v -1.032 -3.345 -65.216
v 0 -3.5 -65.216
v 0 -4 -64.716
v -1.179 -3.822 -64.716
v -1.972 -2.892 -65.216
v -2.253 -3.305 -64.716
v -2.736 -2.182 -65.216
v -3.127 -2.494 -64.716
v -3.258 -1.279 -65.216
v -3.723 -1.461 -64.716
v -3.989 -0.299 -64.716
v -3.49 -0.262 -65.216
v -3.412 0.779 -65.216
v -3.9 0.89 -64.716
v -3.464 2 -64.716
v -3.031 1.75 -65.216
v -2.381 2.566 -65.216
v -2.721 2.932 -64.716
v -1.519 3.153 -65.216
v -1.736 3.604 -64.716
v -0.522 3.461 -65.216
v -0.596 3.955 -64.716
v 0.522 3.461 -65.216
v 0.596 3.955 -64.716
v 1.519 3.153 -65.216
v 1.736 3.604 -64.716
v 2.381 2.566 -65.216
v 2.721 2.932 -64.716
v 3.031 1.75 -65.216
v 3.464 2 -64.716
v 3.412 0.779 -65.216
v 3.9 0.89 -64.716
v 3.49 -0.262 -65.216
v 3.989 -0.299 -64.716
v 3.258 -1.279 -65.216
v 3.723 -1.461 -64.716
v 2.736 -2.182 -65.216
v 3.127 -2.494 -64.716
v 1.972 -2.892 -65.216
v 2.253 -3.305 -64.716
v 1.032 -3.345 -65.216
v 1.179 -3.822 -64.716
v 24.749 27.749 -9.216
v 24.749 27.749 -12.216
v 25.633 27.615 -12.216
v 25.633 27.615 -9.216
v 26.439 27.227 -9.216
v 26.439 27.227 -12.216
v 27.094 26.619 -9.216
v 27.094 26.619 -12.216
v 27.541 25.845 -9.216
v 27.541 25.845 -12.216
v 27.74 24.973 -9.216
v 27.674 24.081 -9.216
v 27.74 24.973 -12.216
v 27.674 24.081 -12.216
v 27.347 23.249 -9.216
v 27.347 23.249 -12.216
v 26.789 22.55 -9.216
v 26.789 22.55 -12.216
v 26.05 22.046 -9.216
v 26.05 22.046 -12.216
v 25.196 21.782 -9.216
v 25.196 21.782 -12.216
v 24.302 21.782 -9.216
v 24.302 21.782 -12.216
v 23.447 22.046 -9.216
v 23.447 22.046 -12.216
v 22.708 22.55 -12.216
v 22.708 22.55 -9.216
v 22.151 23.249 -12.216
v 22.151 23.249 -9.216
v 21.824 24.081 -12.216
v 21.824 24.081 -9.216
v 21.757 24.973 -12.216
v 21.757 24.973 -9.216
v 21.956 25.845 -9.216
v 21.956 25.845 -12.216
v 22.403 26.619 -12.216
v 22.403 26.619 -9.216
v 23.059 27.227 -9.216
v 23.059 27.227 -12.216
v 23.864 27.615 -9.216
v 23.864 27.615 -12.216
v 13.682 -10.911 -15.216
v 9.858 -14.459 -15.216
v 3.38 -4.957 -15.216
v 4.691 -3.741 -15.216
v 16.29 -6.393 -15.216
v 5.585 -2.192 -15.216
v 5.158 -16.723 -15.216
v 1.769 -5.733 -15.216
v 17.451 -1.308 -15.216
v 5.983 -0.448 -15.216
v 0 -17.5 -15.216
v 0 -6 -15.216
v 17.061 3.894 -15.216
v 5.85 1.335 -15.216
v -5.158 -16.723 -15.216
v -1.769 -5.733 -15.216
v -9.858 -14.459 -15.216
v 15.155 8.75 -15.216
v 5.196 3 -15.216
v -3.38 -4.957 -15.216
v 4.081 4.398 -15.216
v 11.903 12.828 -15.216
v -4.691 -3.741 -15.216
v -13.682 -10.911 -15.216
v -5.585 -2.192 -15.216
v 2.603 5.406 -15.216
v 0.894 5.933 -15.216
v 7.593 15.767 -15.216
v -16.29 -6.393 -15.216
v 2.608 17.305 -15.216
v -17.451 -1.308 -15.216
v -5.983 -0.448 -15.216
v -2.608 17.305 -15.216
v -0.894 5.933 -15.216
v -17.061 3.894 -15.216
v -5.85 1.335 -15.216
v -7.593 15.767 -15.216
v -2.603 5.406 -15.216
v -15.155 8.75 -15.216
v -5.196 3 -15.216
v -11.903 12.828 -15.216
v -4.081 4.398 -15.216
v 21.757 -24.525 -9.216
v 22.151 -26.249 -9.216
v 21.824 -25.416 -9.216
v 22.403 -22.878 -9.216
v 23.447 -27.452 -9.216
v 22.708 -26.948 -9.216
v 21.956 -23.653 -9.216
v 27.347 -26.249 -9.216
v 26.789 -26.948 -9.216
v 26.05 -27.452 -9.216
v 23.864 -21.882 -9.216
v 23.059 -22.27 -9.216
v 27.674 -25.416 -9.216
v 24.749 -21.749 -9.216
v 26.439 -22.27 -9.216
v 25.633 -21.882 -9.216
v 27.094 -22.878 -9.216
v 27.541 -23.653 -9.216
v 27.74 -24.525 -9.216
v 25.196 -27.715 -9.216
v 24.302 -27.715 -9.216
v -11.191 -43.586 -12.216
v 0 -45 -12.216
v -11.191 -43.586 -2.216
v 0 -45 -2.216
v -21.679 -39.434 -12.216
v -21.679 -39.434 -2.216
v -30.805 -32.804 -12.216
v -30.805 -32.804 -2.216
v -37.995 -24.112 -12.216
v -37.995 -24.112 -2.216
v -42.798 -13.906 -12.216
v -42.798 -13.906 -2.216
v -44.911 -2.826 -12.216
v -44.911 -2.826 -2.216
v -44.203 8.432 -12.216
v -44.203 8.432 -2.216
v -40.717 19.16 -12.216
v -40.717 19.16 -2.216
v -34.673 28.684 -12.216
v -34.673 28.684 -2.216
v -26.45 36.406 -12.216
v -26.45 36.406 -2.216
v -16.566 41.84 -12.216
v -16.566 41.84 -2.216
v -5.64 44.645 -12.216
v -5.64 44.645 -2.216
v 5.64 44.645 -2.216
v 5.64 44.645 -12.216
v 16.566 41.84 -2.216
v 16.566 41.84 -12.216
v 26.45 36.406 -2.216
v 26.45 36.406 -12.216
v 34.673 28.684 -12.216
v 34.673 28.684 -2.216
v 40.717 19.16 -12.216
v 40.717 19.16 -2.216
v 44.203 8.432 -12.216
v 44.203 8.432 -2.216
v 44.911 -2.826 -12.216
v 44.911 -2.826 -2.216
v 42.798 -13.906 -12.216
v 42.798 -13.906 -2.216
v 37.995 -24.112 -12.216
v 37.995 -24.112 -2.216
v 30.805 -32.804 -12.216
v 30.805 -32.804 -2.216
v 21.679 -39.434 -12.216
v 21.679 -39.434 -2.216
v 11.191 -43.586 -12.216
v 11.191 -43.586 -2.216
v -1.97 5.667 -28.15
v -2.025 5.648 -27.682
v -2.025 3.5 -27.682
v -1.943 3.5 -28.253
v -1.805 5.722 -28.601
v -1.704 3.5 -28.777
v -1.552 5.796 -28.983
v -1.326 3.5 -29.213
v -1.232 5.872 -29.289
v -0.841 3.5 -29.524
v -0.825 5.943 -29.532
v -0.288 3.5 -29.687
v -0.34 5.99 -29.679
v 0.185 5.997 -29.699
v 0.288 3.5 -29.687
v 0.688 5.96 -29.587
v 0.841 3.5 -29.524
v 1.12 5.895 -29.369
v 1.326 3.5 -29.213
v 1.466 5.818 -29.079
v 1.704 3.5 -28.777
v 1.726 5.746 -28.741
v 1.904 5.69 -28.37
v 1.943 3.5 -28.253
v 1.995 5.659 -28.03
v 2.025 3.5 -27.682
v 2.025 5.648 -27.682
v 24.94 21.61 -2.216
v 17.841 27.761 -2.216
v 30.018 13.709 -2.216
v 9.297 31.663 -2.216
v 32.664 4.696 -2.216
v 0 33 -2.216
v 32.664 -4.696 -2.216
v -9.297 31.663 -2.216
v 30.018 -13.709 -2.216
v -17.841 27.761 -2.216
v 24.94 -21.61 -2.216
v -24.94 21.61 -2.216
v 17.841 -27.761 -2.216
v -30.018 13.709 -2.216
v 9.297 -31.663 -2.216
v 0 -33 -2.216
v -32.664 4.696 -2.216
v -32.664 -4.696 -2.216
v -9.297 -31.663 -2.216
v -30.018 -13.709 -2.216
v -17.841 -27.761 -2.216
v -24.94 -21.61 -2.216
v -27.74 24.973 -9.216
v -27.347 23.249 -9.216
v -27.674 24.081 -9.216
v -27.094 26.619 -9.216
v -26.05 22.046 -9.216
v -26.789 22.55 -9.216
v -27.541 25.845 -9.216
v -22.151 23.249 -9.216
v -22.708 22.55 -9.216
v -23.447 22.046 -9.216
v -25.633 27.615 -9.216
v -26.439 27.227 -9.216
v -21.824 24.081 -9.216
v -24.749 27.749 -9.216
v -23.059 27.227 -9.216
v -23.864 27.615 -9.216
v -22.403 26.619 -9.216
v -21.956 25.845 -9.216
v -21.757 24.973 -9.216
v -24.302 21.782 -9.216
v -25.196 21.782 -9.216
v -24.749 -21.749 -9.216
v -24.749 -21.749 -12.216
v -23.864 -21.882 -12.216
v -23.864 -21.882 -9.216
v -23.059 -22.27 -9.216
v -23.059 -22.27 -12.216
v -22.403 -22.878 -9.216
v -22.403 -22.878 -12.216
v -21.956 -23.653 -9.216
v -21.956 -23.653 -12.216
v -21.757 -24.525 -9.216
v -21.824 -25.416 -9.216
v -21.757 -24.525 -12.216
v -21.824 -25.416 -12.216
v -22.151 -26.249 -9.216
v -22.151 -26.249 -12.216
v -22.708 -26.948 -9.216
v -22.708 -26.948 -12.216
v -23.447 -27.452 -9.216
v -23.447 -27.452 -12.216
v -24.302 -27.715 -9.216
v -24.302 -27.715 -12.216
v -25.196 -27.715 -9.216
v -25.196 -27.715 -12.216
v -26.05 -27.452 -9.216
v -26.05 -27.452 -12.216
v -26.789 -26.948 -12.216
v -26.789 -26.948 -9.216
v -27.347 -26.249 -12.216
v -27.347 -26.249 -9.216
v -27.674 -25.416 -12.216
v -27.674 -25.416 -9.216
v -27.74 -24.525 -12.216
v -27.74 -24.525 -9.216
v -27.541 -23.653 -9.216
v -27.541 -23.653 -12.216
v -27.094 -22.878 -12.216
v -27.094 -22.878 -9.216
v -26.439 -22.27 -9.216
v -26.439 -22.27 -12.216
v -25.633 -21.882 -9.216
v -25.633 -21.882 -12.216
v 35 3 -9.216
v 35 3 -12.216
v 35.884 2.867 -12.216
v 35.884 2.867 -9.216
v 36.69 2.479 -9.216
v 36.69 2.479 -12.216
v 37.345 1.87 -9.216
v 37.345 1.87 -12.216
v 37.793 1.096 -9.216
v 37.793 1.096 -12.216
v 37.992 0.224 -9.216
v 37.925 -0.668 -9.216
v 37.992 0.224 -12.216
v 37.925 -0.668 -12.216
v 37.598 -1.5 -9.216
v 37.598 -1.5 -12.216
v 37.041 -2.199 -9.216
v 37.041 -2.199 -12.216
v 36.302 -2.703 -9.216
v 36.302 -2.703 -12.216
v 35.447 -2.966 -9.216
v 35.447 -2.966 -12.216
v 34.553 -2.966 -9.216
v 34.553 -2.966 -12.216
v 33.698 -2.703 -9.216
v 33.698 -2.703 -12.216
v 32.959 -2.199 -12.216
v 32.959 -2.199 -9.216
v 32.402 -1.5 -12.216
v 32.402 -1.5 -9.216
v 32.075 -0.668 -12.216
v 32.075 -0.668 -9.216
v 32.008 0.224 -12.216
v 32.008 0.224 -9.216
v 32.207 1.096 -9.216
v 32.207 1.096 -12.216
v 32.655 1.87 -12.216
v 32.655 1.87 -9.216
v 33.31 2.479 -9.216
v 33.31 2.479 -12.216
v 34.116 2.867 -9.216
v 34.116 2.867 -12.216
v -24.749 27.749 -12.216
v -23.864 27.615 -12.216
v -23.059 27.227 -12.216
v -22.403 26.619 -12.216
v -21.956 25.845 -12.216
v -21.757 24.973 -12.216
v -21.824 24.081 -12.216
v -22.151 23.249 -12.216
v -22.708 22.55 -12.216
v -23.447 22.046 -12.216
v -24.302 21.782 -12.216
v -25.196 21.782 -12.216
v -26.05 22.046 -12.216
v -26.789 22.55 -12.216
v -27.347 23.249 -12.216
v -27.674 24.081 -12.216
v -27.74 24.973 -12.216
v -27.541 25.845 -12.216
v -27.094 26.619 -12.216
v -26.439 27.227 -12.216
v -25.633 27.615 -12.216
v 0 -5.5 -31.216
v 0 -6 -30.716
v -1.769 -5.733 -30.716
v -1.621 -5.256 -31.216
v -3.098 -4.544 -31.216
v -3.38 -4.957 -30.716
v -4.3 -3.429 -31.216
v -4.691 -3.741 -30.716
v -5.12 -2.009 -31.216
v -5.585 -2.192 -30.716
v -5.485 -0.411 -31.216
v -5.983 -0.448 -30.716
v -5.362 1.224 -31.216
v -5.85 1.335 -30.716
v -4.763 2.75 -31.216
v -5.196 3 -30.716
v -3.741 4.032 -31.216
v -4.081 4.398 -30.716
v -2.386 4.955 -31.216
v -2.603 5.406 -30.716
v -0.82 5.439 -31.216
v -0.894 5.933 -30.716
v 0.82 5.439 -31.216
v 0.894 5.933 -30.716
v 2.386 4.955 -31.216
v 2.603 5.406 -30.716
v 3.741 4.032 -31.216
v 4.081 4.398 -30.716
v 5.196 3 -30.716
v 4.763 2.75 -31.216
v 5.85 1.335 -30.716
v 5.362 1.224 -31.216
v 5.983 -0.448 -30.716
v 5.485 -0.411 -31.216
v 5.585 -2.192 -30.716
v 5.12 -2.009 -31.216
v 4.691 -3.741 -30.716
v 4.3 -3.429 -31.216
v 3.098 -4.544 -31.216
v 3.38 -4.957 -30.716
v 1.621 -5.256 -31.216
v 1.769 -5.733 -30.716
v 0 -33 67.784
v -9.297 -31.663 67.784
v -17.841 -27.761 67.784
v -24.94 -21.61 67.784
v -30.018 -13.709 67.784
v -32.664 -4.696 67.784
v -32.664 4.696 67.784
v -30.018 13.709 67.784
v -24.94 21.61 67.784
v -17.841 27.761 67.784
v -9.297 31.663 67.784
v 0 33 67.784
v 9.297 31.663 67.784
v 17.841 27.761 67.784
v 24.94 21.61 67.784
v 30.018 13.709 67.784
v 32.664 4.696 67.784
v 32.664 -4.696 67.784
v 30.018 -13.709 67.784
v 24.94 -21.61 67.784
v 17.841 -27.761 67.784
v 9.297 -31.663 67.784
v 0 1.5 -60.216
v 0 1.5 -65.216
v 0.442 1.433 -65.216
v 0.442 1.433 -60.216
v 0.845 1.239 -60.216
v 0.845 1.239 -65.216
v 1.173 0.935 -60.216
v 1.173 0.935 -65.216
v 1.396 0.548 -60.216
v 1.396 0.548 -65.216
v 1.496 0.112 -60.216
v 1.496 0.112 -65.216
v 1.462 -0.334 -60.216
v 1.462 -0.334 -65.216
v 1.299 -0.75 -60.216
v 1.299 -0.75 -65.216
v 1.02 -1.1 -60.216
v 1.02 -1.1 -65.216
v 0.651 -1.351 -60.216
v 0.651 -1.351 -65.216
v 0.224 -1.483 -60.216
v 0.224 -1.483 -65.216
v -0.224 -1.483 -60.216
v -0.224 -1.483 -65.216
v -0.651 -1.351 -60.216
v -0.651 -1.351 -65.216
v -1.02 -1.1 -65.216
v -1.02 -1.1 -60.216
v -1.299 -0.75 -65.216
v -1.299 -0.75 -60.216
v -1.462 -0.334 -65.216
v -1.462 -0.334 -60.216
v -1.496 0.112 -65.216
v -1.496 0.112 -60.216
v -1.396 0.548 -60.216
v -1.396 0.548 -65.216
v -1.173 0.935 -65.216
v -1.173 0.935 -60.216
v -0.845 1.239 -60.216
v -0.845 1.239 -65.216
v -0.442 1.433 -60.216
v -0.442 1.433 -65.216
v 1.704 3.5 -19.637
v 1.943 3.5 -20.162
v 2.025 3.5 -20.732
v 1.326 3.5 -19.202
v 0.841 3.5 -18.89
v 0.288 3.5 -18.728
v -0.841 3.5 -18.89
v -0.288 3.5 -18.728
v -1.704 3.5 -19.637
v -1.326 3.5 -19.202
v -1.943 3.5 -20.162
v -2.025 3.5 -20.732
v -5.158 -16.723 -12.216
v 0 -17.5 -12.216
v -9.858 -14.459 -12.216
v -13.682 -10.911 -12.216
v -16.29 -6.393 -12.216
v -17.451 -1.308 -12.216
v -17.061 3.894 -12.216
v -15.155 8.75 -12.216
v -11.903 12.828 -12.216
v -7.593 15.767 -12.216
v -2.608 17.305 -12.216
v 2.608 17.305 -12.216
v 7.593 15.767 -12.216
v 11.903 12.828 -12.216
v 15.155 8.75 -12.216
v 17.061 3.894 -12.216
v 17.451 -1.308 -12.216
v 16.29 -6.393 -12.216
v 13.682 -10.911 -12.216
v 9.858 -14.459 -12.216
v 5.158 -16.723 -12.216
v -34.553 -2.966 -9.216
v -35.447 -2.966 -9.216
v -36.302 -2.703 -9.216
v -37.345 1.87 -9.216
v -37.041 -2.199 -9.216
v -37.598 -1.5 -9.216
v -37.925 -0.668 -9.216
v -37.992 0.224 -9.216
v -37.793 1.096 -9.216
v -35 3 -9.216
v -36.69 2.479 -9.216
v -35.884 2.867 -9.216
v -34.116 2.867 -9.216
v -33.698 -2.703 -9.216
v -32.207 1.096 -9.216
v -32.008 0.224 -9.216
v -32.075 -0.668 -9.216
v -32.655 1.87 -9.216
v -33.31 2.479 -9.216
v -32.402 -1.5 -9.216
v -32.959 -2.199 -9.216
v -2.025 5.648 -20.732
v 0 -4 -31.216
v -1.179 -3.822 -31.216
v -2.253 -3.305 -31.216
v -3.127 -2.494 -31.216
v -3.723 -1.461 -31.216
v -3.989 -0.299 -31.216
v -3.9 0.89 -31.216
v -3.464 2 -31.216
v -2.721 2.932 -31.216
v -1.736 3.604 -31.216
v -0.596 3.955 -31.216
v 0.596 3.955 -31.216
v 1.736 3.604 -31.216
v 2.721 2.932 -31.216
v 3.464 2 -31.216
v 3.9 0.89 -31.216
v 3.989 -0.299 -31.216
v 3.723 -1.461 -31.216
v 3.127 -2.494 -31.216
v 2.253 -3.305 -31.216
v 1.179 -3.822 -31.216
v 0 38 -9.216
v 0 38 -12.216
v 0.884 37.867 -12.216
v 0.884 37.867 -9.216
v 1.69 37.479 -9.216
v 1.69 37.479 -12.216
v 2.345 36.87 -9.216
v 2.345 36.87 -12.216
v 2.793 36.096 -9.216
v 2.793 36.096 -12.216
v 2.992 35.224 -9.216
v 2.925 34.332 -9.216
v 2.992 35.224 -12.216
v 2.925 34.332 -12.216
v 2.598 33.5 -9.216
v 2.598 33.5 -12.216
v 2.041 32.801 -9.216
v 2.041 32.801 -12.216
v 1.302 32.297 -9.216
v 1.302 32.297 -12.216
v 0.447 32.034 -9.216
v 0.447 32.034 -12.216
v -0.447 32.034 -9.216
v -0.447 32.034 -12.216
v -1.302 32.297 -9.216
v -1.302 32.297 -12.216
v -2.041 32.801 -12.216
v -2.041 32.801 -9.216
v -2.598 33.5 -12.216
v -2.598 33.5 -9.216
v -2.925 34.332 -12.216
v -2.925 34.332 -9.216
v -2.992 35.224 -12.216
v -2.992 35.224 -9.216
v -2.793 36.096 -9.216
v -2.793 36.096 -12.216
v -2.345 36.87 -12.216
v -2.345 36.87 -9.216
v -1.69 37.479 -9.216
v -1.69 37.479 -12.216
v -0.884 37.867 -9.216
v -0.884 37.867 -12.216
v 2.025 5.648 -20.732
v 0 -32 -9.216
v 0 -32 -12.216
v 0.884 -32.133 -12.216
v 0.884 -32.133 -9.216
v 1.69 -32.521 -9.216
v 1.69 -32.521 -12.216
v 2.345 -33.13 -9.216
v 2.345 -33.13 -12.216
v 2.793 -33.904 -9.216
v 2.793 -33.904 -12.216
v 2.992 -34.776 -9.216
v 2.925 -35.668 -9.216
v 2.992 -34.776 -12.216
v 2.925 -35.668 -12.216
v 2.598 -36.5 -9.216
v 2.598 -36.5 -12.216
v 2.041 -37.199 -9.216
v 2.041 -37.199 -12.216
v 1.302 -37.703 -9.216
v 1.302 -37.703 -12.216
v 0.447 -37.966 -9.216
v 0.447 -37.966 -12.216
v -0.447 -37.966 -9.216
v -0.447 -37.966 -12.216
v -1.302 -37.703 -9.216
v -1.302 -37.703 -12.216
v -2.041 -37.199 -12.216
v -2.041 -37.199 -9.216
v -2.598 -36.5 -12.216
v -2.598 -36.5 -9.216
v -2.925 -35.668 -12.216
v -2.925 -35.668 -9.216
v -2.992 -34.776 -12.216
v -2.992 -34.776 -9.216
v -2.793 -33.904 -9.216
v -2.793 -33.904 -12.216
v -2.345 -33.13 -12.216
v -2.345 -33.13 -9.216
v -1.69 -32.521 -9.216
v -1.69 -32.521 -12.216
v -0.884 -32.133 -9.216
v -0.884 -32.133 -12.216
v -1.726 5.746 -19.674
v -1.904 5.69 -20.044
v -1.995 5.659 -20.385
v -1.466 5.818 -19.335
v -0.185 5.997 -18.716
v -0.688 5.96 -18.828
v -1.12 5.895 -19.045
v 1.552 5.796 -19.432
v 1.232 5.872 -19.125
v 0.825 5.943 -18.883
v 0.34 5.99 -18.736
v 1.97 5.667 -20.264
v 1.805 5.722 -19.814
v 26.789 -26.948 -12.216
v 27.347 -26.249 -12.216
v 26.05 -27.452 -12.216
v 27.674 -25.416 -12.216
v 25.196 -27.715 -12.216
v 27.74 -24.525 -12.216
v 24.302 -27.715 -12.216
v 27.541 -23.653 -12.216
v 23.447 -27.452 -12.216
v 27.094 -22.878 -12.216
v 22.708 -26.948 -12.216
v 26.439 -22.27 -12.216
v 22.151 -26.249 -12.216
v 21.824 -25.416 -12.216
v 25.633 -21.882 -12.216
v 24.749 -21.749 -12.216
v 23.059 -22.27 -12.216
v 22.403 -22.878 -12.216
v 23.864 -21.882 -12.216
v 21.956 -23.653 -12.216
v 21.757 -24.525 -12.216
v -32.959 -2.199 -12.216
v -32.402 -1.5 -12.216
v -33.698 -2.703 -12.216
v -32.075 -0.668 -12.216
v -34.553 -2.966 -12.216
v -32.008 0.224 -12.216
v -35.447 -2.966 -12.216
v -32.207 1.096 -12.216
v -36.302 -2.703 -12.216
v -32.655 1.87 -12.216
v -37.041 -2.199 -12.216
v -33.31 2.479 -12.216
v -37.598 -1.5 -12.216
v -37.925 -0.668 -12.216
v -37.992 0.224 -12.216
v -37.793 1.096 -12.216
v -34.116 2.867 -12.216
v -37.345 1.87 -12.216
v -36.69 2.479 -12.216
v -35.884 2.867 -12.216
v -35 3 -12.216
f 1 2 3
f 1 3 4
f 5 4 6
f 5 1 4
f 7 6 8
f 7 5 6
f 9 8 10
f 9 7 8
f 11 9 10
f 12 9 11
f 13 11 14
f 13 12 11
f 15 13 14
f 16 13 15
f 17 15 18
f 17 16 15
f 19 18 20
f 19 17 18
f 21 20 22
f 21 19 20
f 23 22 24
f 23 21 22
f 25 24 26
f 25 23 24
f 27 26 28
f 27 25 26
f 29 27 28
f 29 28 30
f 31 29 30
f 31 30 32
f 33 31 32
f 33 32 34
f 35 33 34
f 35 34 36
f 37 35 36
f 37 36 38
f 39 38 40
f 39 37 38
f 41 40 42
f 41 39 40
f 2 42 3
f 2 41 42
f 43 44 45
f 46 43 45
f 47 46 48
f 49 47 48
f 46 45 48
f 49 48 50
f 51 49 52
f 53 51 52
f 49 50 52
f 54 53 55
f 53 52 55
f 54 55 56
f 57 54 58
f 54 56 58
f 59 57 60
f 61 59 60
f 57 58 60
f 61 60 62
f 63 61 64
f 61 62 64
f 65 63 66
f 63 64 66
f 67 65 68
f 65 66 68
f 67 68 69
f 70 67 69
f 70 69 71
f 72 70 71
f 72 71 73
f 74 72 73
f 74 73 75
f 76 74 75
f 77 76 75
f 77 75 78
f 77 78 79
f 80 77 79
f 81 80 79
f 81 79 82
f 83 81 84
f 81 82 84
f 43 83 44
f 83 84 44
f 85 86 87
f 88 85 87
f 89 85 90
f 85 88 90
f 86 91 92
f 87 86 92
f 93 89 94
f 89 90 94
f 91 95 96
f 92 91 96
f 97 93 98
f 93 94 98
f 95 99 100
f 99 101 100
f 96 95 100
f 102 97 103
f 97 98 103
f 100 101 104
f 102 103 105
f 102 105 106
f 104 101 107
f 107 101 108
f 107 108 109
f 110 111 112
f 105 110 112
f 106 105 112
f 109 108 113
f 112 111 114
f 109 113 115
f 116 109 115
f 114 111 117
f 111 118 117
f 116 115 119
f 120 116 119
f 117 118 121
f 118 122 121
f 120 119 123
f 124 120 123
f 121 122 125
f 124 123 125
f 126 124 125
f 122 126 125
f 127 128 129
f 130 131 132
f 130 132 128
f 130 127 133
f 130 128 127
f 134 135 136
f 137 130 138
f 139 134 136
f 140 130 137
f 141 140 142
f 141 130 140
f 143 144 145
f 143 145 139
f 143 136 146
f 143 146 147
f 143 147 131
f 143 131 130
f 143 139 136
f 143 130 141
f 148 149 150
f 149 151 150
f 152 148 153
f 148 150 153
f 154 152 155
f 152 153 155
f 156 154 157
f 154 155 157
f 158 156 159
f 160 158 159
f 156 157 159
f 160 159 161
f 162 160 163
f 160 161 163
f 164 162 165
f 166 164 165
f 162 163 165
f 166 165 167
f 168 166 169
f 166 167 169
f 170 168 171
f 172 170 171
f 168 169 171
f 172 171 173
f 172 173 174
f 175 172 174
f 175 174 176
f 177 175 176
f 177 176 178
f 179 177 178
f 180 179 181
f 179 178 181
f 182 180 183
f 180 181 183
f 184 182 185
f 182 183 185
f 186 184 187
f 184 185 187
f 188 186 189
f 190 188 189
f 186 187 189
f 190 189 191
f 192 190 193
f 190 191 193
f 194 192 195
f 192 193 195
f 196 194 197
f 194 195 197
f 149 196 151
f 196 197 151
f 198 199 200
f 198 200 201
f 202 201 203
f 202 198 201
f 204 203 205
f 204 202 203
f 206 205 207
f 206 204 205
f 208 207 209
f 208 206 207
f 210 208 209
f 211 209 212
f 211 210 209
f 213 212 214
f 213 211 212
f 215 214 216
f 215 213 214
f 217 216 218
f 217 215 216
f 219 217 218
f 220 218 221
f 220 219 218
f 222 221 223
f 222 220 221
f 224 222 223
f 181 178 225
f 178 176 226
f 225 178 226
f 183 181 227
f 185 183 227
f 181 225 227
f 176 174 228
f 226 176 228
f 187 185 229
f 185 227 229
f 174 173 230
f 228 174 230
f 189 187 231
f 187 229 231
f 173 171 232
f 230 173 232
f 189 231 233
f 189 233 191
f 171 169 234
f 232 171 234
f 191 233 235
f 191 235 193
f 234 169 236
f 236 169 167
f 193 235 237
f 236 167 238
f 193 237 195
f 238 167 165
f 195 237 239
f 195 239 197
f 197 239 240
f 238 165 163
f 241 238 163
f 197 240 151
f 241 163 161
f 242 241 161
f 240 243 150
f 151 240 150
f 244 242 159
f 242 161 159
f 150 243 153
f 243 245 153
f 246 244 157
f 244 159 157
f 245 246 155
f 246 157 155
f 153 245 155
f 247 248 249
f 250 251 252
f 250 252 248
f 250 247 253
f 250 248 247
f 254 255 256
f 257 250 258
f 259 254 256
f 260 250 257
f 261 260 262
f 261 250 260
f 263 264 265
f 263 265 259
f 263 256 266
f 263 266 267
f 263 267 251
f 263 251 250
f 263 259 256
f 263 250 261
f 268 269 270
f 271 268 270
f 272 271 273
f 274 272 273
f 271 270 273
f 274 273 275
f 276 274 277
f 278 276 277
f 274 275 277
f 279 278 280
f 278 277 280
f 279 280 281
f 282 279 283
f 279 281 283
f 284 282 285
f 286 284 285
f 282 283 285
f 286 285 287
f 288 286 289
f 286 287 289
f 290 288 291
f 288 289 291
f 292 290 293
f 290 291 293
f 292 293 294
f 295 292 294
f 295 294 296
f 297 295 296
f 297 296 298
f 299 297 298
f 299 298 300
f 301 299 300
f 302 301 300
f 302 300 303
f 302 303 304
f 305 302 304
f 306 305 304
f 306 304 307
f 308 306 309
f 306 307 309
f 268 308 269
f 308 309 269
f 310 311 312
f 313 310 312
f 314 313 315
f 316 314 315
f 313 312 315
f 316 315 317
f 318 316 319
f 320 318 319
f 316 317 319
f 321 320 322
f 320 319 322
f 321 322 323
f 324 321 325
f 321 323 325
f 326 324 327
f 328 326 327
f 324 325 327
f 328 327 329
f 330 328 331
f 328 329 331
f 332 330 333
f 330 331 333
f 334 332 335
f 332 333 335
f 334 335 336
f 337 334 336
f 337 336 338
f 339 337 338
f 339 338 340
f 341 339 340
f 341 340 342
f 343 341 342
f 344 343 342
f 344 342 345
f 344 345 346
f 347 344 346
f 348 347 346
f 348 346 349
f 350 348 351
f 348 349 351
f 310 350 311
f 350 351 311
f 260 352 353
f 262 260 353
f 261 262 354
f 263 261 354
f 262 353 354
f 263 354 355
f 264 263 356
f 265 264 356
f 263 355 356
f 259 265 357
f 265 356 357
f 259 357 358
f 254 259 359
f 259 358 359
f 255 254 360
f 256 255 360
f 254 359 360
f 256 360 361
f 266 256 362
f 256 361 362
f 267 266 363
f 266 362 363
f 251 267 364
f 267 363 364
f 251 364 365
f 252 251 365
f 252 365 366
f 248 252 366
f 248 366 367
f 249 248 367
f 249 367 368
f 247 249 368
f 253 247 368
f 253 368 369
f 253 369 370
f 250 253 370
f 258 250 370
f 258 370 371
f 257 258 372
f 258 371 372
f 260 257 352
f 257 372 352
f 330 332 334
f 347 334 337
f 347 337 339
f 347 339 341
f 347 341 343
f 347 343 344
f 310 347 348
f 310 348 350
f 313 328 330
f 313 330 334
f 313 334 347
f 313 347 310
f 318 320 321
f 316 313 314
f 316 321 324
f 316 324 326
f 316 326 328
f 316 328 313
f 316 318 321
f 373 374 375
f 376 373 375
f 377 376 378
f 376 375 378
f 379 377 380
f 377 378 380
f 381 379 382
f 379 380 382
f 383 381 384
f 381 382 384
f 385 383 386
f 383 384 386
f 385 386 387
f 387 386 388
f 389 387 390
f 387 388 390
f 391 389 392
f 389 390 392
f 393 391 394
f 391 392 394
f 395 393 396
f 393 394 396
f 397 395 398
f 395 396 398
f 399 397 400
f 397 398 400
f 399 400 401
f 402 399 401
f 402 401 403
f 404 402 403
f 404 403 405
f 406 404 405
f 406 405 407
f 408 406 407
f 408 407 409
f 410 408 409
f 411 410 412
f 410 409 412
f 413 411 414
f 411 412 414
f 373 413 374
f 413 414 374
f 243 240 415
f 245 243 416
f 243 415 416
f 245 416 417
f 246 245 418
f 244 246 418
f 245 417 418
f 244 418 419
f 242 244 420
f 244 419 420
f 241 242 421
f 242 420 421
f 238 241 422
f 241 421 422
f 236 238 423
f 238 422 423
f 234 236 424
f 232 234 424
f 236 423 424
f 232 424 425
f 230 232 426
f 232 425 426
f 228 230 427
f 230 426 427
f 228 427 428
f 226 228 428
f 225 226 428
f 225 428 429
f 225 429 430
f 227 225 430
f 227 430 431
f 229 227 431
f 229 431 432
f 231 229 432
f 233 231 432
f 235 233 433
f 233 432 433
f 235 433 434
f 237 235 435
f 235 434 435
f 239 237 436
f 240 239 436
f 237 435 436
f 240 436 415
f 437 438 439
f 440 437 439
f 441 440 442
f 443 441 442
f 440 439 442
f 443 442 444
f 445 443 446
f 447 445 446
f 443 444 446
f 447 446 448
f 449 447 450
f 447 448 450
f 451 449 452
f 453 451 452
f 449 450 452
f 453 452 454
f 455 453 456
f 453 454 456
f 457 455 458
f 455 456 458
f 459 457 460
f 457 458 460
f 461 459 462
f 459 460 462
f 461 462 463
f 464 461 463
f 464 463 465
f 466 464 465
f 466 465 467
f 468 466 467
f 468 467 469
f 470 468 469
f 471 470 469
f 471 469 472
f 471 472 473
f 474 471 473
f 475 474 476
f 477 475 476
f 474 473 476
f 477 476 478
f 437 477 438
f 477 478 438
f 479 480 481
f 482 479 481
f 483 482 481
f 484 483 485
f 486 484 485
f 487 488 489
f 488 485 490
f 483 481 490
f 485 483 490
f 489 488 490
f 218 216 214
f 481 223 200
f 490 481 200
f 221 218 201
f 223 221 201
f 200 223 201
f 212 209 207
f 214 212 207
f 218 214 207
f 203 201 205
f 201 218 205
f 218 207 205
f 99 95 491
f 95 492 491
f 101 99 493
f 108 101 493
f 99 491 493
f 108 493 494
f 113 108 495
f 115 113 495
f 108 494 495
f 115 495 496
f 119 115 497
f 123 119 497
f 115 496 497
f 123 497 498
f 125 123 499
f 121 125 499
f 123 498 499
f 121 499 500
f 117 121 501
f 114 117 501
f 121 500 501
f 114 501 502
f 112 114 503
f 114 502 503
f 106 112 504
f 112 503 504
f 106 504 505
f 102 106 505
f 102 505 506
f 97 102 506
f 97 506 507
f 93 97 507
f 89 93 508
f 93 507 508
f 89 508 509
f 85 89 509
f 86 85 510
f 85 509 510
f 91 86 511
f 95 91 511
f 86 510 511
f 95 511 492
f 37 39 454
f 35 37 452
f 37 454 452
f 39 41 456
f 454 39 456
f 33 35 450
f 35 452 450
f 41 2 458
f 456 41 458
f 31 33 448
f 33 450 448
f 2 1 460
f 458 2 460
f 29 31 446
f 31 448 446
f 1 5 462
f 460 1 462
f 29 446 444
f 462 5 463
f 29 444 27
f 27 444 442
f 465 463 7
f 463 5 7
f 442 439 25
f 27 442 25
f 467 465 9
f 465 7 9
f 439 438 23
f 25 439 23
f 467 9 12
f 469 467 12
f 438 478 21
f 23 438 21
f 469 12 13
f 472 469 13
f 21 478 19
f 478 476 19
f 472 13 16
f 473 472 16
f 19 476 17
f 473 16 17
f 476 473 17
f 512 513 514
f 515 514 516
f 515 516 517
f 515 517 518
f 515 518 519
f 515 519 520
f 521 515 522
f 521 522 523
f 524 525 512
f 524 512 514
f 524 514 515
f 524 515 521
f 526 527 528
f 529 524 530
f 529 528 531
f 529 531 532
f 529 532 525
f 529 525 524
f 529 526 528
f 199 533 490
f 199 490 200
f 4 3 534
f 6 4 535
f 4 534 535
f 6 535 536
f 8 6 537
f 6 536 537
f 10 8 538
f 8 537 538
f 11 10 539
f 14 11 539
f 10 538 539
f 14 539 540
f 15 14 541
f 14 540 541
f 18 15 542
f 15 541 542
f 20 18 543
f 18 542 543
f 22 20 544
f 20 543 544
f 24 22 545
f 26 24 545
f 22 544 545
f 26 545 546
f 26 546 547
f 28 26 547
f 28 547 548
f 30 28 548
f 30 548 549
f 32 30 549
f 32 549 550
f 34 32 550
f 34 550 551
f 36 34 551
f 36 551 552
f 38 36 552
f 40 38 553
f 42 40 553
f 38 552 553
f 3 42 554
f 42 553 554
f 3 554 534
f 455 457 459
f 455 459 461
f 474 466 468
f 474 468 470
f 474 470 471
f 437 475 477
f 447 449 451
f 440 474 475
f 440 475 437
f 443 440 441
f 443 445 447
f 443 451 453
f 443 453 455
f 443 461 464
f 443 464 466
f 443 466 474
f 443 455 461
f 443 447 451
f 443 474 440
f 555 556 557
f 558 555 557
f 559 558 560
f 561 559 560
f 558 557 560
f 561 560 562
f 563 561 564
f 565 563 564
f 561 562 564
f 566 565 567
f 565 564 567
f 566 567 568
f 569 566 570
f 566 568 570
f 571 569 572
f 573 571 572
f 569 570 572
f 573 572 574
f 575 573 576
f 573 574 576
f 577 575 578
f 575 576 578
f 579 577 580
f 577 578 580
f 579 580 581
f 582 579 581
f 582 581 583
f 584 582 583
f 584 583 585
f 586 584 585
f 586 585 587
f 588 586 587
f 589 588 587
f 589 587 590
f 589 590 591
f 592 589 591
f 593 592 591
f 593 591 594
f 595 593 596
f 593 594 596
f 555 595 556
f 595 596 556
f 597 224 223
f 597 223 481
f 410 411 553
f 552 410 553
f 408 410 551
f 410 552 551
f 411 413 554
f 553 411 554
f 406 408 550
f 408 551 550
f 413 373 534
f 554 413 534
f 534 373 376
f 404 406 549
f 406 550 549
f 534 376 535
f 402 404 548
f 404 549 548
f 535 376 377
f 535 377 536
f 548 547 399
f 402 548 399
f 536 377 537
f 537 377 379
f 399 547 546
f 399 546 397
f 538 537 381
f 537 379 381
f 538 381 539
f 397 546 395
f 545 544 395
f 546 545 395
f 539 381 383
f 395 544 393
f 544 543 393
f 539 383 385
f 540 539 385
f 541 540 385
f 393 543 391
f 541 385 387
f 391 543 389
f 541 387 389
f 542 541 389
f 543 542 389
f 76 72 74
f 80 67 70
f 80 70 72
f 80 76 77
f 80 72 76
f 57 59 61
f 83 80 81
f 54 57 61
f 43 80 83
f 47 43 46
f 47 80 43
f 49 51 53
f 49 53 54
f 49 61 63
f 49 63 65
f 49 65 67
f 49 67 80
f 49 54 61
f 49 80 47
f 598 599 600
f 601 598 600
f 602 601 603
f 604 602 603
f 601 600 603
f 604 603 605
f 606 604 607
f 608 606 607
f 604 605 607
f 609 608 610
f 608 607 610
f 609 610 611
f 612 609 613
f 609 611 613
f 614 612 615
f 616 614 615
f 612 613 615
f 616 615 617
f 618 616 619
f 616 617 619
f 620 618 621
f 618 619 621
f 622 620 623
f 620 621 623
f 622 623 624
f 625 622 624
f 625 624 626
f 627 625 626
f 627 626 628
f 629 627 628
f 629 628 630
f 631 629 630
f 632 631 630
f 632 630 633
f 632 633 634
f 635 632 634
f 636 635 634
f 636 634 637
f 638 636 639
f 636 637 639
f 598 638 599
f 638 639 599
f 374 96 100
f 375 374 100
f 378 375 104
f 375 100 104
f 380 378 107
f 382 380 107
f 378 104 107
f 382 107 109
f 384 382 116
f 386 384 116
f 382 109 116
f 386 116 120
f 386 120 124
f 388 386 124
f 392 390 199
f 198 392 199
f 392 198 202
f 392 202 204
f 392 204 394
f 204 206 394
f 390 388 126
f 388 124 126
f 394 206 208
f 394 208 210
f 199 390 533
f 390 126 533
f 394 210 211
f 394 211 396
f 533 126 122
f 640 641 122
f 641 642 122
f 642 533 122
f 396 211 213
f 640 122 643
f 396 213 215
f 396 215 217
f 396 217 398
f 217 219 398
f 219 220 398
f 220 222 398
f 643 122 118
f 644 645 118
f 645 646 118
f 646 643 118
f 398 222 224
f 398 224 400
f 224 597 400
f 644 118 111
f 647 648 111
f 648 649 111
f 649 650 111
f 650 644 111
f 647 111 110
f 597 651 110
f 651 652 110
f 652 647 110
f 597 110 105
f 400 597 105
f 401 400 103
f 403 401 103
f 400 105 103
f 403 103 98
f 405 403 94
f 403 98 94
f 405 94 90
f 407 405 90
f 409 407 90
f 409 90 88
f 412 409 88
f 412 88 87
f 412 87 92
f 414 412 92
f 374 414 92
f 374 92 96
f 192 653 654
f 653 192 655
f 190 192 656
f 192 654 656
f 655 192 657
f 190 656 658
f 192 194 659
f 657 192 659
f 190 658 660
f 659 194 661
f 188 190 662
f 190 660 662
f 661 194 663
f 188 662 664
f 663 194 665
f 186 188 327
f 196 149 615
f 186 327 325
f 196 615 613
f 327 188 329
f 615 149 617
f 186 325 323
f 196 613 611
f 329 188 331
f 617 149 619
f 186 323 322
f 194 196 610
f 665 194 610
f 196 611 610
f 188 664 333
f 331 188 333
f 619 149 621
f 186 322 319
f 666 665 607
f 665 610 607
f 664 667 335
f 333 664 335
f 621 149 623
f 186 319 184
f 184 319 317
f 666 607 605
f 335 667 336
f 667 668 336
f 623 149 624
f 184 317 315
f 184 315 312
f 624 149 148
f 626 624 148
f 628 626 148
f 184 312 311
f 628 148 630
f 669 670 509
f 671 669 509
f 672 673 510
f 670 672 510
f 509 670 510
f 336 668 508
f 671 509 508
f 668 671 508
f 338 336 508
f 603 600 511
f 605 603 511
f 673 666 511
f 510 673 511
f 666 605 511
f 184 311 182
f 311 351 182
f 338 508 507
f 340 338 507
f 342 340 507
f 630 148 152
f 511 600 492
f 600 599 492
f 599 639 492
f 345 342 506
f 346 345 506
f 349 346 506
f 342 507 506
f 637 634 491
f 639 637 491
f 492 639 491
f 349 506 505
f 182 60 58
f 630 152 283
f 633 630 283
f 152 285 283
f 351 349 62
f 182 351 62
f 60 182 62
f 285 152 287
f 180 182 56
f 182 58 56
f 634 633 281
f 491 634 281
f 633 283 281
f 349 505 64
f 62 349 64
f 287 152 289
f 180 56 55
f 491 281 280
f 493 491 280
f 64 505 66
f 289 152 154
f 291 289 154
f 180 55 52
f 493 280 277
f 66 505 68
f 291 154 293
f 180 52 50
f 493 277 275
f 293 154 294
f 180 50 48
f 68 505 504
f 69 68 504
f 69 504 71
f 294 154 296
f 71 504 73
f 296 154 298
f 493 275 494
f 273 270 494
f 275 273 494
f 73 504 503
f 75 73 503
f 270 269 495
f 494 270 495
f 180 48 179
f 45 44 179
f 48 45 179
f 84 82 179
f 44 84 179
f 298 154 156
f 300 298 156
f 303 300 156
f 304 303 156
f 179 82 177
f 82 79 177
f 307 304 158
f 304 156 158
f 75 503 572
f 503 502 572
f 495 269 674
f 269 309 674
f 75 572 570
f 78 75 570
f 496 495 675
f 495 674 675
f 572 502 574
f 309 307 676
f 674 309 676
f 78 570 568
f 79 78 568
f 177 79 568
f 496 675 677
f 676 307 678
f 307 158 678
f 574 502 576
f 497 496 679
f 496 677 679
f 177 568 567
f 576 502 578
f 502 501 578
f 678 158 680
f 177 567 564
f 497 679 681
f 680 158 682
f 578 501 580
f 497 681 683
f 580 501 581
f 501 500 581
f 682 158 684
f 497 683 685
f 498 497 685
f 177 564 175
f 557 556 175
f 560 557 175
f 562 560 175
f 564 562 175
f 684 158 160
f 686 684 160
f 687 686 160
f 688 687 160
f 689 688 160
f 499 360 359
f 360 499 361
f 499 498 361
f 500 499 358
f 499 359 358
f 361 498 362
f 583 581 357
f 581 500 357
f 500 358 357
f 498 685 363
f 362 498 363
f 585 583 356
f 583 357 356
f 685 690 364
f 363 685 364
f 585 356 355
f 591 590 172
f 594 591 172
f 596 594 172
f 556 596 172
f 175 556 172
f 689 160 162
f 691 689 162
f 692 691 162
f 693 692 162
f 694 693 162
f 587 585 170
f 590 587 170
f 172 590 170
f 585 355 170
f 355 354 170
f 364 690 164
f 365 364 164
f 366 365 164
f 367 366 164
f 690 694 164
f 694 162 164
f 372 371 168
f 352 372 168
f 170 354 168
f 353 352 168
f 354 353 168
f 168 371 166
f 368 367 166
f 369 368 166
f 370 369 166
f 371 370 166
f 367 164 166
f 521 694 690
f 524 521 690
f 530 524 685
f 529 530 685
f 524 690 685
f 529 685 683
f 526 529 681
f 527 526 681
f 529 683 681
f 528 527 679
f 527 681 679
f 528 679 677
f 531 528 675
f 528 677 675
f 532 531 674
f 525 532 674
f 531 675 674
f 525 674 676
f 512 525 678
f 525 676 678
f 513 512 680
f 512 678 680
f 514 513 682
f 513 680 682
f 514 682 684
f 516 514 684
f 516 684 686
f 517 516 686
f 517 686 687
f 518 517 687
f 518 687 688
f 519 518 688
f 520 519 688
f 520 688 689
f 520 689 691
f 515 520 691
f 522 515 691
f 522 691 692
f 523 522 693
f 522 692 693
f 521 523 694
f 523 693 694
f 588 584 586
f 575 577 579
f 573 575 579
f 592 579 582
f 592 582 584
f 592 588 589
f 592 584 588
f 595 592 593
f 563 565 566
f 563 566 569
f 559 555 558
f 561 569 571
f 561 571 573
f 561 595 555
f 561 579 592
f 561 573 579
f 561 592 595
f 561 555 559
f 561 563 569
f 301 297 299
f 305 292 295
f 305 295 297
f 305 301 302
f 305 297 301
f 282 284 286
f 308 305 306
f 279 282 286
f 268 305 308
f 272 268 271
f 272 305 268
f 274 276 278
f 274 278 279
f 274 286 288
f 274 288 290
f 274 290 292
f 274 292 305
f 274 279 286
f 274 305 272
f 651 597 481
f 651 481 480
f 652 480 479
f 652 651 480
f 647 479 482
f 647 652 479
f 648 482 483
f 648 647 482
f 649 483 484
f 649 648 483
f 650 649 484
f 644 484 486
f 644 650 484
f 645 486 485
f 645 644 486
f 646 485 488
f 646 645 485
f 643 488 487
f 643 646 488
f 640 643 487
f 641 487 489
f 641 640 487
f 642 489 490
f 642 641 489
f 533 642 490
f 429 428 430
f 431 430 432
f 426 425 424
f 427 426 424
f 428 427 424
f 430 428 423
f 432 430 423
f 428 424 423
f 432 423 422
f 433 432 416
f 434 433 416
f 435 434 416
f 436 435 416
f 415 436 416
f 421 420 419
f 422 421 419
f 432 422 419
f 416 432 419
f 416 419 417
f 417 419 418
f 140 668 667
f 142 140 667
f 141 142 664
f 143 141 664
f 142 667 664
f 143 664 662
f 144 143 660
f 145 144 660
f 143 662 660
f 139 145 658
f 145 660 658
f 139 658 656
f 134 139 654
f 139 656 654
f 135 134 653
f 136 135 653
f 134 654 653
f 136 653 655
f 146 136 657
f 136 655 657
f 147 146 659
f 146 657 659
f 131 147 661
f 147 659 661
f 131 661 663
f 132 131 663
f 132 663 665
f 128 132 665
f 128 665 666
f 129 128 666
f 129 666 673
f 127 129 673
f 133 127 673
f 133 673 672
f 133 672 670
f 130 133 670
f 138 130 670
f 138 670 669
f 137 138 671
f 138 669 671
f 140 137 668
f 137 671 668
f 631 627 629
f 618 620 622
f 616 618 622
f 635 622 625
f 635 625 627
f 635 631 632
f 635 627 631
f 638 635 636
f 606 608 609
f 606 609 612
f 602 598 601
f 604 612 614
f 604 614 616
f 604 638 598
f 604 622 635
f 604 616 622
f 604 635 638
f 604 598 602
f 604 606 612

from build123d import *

# Parameters (mm, degrees)
CUT_EXTRUDE1_DEPTH = 2.5
CHAMFER1_SIZE      = 0.5
SKETCH7_R          = 3
CUT_EXTRUDE4_DEPTH = 3
SKETCH8_R          = 1.5
CUT_EXTRUDE5_DEPTH = 5
CHAMFER2_SIZE      = 0.5


with BuildPart() as part:
    # Sketch1 → Revolve1 (revolve)
    with BuildSketch(Plane(origin=(0, 0, 0), x_dir=(0, 0, -1), z_dir=(1, 0, 0)), mode=Mode.PRIVATE) as revolve1_sk:
        Polygon((-67.783857366, 0), (65.216142634, 0), (65.216142634, 4), (31.216142634, 4), (31.216142634, 6), (15.216142634, 6), (15.216142634, 17.5), (12.216142634, 17.5), (12.216142634, 45), (2.216142634, 45), (2.216142634, 33), (-67.783857366, 33), align=None)
    revolve(revolve1_sk.sketch.rotate(Axis((0, 0, 67.783857366), (0, 0, -1)), 180), axis=Axis((0, 0, 67.783857366), (0, 0, -1)))

    # Sketch2 → Cut-Extrude1 (cut)
    with BuildSketch(Plane(origin=(0, 6, 0), x_dir=(1, 0, 0), z_dir=(0, 1, 0))):
        with BuildLine():
            Line((-2.025, 20.732267436), (-2.025, 27.682267436))
            ThreePointArc((-2.025, 27.682267436), (0, 29.707267436), (2.025, 27.682267436))
            Line((2.025, 27.682267436), (2.025, 20.732267436))
            ThreePointArc((2.025, 20.732267436), (0, 18.707267436), (-2.025, 20.732267436))
        make_face()
    extrude(amount=-CUT_EXTRUDE1_DEPTH, mode=Mode.SUBTRACT)

    # Chamfer1
    chamfer1_edges = [part.edges().sort_by_distance(p)[0] for p in [
        (0, 6, -31.216142634),
    ]]
    chamfer(chamfer1_edges, length=CHAMFER1_SIZE)

    # Sketch7 → Cut-Extrude4 (cut)
    with BuildSketch(Plane(origin=(0, 0, -12.216142634), x_dir=(-1, 0, 0), z_dir=(0, 0, -1))):
        with Locations(Location((0, 35, 0), (0, 0, 90))):
            Circle(SKETCH7_R)
        with Locations(Location((24.748737342, 24.748737342, 0), (0, 0, 90))):
            Circle(SKETCH7_R)
        with Locations(Location((35, 0, 0), (0, 0, 90))):
            Circle(SKETCH7_R)
        with Locations(Location((24.748737342, -24.748737342, 0), (0, 0, 90))):
            Circle(SKETCH7_R)
        with Locations(Location((0, -35, 0), (0, 0, 90))):
            Circle(SKETCH7_R)
        with Locations(Location((-24.748737342, -24.748737342, 0), (0, 0, 90))):
            Circle(SKETCH7_R)
        with Locations(Location((-35, 0, 0), (0, 0, 90))):
            Circle(SKETCH7_R)
        with Locations(Location((-24.748737342, 24.748737342, 0), (0, 0, 90))):
            Circle(SKETCH7_R)
    extrude(amount=-CUT_EXTRUDE4_DEPTH, mode=Mode.SUBTRACT)

    # Sketch8 → Cut-Extrude5 (cut)
    with BuildSketch(Plane(origin=(0, 0, -65.216142634), x_dir=(-1, 0, 0), z_dir=(0, 0, -1))):
        with Locations(Location((0, 0, 0), (0, 0, 90))):
            Circle(SKETCH8_R)
    extrude(amount=-CUT_EXTRUDE5_DEPTH, mode=Mode.SUBTRACT)

    # Chamfer2
    chamfer2_edges = [part.edges().sort_by_distance(p)[0] for p in [
        (0, 4, -65.216142634),
    ]]
    chamfer(chamfer2_edges, length=CHAMFER2_SIZE)


solid = part.part
